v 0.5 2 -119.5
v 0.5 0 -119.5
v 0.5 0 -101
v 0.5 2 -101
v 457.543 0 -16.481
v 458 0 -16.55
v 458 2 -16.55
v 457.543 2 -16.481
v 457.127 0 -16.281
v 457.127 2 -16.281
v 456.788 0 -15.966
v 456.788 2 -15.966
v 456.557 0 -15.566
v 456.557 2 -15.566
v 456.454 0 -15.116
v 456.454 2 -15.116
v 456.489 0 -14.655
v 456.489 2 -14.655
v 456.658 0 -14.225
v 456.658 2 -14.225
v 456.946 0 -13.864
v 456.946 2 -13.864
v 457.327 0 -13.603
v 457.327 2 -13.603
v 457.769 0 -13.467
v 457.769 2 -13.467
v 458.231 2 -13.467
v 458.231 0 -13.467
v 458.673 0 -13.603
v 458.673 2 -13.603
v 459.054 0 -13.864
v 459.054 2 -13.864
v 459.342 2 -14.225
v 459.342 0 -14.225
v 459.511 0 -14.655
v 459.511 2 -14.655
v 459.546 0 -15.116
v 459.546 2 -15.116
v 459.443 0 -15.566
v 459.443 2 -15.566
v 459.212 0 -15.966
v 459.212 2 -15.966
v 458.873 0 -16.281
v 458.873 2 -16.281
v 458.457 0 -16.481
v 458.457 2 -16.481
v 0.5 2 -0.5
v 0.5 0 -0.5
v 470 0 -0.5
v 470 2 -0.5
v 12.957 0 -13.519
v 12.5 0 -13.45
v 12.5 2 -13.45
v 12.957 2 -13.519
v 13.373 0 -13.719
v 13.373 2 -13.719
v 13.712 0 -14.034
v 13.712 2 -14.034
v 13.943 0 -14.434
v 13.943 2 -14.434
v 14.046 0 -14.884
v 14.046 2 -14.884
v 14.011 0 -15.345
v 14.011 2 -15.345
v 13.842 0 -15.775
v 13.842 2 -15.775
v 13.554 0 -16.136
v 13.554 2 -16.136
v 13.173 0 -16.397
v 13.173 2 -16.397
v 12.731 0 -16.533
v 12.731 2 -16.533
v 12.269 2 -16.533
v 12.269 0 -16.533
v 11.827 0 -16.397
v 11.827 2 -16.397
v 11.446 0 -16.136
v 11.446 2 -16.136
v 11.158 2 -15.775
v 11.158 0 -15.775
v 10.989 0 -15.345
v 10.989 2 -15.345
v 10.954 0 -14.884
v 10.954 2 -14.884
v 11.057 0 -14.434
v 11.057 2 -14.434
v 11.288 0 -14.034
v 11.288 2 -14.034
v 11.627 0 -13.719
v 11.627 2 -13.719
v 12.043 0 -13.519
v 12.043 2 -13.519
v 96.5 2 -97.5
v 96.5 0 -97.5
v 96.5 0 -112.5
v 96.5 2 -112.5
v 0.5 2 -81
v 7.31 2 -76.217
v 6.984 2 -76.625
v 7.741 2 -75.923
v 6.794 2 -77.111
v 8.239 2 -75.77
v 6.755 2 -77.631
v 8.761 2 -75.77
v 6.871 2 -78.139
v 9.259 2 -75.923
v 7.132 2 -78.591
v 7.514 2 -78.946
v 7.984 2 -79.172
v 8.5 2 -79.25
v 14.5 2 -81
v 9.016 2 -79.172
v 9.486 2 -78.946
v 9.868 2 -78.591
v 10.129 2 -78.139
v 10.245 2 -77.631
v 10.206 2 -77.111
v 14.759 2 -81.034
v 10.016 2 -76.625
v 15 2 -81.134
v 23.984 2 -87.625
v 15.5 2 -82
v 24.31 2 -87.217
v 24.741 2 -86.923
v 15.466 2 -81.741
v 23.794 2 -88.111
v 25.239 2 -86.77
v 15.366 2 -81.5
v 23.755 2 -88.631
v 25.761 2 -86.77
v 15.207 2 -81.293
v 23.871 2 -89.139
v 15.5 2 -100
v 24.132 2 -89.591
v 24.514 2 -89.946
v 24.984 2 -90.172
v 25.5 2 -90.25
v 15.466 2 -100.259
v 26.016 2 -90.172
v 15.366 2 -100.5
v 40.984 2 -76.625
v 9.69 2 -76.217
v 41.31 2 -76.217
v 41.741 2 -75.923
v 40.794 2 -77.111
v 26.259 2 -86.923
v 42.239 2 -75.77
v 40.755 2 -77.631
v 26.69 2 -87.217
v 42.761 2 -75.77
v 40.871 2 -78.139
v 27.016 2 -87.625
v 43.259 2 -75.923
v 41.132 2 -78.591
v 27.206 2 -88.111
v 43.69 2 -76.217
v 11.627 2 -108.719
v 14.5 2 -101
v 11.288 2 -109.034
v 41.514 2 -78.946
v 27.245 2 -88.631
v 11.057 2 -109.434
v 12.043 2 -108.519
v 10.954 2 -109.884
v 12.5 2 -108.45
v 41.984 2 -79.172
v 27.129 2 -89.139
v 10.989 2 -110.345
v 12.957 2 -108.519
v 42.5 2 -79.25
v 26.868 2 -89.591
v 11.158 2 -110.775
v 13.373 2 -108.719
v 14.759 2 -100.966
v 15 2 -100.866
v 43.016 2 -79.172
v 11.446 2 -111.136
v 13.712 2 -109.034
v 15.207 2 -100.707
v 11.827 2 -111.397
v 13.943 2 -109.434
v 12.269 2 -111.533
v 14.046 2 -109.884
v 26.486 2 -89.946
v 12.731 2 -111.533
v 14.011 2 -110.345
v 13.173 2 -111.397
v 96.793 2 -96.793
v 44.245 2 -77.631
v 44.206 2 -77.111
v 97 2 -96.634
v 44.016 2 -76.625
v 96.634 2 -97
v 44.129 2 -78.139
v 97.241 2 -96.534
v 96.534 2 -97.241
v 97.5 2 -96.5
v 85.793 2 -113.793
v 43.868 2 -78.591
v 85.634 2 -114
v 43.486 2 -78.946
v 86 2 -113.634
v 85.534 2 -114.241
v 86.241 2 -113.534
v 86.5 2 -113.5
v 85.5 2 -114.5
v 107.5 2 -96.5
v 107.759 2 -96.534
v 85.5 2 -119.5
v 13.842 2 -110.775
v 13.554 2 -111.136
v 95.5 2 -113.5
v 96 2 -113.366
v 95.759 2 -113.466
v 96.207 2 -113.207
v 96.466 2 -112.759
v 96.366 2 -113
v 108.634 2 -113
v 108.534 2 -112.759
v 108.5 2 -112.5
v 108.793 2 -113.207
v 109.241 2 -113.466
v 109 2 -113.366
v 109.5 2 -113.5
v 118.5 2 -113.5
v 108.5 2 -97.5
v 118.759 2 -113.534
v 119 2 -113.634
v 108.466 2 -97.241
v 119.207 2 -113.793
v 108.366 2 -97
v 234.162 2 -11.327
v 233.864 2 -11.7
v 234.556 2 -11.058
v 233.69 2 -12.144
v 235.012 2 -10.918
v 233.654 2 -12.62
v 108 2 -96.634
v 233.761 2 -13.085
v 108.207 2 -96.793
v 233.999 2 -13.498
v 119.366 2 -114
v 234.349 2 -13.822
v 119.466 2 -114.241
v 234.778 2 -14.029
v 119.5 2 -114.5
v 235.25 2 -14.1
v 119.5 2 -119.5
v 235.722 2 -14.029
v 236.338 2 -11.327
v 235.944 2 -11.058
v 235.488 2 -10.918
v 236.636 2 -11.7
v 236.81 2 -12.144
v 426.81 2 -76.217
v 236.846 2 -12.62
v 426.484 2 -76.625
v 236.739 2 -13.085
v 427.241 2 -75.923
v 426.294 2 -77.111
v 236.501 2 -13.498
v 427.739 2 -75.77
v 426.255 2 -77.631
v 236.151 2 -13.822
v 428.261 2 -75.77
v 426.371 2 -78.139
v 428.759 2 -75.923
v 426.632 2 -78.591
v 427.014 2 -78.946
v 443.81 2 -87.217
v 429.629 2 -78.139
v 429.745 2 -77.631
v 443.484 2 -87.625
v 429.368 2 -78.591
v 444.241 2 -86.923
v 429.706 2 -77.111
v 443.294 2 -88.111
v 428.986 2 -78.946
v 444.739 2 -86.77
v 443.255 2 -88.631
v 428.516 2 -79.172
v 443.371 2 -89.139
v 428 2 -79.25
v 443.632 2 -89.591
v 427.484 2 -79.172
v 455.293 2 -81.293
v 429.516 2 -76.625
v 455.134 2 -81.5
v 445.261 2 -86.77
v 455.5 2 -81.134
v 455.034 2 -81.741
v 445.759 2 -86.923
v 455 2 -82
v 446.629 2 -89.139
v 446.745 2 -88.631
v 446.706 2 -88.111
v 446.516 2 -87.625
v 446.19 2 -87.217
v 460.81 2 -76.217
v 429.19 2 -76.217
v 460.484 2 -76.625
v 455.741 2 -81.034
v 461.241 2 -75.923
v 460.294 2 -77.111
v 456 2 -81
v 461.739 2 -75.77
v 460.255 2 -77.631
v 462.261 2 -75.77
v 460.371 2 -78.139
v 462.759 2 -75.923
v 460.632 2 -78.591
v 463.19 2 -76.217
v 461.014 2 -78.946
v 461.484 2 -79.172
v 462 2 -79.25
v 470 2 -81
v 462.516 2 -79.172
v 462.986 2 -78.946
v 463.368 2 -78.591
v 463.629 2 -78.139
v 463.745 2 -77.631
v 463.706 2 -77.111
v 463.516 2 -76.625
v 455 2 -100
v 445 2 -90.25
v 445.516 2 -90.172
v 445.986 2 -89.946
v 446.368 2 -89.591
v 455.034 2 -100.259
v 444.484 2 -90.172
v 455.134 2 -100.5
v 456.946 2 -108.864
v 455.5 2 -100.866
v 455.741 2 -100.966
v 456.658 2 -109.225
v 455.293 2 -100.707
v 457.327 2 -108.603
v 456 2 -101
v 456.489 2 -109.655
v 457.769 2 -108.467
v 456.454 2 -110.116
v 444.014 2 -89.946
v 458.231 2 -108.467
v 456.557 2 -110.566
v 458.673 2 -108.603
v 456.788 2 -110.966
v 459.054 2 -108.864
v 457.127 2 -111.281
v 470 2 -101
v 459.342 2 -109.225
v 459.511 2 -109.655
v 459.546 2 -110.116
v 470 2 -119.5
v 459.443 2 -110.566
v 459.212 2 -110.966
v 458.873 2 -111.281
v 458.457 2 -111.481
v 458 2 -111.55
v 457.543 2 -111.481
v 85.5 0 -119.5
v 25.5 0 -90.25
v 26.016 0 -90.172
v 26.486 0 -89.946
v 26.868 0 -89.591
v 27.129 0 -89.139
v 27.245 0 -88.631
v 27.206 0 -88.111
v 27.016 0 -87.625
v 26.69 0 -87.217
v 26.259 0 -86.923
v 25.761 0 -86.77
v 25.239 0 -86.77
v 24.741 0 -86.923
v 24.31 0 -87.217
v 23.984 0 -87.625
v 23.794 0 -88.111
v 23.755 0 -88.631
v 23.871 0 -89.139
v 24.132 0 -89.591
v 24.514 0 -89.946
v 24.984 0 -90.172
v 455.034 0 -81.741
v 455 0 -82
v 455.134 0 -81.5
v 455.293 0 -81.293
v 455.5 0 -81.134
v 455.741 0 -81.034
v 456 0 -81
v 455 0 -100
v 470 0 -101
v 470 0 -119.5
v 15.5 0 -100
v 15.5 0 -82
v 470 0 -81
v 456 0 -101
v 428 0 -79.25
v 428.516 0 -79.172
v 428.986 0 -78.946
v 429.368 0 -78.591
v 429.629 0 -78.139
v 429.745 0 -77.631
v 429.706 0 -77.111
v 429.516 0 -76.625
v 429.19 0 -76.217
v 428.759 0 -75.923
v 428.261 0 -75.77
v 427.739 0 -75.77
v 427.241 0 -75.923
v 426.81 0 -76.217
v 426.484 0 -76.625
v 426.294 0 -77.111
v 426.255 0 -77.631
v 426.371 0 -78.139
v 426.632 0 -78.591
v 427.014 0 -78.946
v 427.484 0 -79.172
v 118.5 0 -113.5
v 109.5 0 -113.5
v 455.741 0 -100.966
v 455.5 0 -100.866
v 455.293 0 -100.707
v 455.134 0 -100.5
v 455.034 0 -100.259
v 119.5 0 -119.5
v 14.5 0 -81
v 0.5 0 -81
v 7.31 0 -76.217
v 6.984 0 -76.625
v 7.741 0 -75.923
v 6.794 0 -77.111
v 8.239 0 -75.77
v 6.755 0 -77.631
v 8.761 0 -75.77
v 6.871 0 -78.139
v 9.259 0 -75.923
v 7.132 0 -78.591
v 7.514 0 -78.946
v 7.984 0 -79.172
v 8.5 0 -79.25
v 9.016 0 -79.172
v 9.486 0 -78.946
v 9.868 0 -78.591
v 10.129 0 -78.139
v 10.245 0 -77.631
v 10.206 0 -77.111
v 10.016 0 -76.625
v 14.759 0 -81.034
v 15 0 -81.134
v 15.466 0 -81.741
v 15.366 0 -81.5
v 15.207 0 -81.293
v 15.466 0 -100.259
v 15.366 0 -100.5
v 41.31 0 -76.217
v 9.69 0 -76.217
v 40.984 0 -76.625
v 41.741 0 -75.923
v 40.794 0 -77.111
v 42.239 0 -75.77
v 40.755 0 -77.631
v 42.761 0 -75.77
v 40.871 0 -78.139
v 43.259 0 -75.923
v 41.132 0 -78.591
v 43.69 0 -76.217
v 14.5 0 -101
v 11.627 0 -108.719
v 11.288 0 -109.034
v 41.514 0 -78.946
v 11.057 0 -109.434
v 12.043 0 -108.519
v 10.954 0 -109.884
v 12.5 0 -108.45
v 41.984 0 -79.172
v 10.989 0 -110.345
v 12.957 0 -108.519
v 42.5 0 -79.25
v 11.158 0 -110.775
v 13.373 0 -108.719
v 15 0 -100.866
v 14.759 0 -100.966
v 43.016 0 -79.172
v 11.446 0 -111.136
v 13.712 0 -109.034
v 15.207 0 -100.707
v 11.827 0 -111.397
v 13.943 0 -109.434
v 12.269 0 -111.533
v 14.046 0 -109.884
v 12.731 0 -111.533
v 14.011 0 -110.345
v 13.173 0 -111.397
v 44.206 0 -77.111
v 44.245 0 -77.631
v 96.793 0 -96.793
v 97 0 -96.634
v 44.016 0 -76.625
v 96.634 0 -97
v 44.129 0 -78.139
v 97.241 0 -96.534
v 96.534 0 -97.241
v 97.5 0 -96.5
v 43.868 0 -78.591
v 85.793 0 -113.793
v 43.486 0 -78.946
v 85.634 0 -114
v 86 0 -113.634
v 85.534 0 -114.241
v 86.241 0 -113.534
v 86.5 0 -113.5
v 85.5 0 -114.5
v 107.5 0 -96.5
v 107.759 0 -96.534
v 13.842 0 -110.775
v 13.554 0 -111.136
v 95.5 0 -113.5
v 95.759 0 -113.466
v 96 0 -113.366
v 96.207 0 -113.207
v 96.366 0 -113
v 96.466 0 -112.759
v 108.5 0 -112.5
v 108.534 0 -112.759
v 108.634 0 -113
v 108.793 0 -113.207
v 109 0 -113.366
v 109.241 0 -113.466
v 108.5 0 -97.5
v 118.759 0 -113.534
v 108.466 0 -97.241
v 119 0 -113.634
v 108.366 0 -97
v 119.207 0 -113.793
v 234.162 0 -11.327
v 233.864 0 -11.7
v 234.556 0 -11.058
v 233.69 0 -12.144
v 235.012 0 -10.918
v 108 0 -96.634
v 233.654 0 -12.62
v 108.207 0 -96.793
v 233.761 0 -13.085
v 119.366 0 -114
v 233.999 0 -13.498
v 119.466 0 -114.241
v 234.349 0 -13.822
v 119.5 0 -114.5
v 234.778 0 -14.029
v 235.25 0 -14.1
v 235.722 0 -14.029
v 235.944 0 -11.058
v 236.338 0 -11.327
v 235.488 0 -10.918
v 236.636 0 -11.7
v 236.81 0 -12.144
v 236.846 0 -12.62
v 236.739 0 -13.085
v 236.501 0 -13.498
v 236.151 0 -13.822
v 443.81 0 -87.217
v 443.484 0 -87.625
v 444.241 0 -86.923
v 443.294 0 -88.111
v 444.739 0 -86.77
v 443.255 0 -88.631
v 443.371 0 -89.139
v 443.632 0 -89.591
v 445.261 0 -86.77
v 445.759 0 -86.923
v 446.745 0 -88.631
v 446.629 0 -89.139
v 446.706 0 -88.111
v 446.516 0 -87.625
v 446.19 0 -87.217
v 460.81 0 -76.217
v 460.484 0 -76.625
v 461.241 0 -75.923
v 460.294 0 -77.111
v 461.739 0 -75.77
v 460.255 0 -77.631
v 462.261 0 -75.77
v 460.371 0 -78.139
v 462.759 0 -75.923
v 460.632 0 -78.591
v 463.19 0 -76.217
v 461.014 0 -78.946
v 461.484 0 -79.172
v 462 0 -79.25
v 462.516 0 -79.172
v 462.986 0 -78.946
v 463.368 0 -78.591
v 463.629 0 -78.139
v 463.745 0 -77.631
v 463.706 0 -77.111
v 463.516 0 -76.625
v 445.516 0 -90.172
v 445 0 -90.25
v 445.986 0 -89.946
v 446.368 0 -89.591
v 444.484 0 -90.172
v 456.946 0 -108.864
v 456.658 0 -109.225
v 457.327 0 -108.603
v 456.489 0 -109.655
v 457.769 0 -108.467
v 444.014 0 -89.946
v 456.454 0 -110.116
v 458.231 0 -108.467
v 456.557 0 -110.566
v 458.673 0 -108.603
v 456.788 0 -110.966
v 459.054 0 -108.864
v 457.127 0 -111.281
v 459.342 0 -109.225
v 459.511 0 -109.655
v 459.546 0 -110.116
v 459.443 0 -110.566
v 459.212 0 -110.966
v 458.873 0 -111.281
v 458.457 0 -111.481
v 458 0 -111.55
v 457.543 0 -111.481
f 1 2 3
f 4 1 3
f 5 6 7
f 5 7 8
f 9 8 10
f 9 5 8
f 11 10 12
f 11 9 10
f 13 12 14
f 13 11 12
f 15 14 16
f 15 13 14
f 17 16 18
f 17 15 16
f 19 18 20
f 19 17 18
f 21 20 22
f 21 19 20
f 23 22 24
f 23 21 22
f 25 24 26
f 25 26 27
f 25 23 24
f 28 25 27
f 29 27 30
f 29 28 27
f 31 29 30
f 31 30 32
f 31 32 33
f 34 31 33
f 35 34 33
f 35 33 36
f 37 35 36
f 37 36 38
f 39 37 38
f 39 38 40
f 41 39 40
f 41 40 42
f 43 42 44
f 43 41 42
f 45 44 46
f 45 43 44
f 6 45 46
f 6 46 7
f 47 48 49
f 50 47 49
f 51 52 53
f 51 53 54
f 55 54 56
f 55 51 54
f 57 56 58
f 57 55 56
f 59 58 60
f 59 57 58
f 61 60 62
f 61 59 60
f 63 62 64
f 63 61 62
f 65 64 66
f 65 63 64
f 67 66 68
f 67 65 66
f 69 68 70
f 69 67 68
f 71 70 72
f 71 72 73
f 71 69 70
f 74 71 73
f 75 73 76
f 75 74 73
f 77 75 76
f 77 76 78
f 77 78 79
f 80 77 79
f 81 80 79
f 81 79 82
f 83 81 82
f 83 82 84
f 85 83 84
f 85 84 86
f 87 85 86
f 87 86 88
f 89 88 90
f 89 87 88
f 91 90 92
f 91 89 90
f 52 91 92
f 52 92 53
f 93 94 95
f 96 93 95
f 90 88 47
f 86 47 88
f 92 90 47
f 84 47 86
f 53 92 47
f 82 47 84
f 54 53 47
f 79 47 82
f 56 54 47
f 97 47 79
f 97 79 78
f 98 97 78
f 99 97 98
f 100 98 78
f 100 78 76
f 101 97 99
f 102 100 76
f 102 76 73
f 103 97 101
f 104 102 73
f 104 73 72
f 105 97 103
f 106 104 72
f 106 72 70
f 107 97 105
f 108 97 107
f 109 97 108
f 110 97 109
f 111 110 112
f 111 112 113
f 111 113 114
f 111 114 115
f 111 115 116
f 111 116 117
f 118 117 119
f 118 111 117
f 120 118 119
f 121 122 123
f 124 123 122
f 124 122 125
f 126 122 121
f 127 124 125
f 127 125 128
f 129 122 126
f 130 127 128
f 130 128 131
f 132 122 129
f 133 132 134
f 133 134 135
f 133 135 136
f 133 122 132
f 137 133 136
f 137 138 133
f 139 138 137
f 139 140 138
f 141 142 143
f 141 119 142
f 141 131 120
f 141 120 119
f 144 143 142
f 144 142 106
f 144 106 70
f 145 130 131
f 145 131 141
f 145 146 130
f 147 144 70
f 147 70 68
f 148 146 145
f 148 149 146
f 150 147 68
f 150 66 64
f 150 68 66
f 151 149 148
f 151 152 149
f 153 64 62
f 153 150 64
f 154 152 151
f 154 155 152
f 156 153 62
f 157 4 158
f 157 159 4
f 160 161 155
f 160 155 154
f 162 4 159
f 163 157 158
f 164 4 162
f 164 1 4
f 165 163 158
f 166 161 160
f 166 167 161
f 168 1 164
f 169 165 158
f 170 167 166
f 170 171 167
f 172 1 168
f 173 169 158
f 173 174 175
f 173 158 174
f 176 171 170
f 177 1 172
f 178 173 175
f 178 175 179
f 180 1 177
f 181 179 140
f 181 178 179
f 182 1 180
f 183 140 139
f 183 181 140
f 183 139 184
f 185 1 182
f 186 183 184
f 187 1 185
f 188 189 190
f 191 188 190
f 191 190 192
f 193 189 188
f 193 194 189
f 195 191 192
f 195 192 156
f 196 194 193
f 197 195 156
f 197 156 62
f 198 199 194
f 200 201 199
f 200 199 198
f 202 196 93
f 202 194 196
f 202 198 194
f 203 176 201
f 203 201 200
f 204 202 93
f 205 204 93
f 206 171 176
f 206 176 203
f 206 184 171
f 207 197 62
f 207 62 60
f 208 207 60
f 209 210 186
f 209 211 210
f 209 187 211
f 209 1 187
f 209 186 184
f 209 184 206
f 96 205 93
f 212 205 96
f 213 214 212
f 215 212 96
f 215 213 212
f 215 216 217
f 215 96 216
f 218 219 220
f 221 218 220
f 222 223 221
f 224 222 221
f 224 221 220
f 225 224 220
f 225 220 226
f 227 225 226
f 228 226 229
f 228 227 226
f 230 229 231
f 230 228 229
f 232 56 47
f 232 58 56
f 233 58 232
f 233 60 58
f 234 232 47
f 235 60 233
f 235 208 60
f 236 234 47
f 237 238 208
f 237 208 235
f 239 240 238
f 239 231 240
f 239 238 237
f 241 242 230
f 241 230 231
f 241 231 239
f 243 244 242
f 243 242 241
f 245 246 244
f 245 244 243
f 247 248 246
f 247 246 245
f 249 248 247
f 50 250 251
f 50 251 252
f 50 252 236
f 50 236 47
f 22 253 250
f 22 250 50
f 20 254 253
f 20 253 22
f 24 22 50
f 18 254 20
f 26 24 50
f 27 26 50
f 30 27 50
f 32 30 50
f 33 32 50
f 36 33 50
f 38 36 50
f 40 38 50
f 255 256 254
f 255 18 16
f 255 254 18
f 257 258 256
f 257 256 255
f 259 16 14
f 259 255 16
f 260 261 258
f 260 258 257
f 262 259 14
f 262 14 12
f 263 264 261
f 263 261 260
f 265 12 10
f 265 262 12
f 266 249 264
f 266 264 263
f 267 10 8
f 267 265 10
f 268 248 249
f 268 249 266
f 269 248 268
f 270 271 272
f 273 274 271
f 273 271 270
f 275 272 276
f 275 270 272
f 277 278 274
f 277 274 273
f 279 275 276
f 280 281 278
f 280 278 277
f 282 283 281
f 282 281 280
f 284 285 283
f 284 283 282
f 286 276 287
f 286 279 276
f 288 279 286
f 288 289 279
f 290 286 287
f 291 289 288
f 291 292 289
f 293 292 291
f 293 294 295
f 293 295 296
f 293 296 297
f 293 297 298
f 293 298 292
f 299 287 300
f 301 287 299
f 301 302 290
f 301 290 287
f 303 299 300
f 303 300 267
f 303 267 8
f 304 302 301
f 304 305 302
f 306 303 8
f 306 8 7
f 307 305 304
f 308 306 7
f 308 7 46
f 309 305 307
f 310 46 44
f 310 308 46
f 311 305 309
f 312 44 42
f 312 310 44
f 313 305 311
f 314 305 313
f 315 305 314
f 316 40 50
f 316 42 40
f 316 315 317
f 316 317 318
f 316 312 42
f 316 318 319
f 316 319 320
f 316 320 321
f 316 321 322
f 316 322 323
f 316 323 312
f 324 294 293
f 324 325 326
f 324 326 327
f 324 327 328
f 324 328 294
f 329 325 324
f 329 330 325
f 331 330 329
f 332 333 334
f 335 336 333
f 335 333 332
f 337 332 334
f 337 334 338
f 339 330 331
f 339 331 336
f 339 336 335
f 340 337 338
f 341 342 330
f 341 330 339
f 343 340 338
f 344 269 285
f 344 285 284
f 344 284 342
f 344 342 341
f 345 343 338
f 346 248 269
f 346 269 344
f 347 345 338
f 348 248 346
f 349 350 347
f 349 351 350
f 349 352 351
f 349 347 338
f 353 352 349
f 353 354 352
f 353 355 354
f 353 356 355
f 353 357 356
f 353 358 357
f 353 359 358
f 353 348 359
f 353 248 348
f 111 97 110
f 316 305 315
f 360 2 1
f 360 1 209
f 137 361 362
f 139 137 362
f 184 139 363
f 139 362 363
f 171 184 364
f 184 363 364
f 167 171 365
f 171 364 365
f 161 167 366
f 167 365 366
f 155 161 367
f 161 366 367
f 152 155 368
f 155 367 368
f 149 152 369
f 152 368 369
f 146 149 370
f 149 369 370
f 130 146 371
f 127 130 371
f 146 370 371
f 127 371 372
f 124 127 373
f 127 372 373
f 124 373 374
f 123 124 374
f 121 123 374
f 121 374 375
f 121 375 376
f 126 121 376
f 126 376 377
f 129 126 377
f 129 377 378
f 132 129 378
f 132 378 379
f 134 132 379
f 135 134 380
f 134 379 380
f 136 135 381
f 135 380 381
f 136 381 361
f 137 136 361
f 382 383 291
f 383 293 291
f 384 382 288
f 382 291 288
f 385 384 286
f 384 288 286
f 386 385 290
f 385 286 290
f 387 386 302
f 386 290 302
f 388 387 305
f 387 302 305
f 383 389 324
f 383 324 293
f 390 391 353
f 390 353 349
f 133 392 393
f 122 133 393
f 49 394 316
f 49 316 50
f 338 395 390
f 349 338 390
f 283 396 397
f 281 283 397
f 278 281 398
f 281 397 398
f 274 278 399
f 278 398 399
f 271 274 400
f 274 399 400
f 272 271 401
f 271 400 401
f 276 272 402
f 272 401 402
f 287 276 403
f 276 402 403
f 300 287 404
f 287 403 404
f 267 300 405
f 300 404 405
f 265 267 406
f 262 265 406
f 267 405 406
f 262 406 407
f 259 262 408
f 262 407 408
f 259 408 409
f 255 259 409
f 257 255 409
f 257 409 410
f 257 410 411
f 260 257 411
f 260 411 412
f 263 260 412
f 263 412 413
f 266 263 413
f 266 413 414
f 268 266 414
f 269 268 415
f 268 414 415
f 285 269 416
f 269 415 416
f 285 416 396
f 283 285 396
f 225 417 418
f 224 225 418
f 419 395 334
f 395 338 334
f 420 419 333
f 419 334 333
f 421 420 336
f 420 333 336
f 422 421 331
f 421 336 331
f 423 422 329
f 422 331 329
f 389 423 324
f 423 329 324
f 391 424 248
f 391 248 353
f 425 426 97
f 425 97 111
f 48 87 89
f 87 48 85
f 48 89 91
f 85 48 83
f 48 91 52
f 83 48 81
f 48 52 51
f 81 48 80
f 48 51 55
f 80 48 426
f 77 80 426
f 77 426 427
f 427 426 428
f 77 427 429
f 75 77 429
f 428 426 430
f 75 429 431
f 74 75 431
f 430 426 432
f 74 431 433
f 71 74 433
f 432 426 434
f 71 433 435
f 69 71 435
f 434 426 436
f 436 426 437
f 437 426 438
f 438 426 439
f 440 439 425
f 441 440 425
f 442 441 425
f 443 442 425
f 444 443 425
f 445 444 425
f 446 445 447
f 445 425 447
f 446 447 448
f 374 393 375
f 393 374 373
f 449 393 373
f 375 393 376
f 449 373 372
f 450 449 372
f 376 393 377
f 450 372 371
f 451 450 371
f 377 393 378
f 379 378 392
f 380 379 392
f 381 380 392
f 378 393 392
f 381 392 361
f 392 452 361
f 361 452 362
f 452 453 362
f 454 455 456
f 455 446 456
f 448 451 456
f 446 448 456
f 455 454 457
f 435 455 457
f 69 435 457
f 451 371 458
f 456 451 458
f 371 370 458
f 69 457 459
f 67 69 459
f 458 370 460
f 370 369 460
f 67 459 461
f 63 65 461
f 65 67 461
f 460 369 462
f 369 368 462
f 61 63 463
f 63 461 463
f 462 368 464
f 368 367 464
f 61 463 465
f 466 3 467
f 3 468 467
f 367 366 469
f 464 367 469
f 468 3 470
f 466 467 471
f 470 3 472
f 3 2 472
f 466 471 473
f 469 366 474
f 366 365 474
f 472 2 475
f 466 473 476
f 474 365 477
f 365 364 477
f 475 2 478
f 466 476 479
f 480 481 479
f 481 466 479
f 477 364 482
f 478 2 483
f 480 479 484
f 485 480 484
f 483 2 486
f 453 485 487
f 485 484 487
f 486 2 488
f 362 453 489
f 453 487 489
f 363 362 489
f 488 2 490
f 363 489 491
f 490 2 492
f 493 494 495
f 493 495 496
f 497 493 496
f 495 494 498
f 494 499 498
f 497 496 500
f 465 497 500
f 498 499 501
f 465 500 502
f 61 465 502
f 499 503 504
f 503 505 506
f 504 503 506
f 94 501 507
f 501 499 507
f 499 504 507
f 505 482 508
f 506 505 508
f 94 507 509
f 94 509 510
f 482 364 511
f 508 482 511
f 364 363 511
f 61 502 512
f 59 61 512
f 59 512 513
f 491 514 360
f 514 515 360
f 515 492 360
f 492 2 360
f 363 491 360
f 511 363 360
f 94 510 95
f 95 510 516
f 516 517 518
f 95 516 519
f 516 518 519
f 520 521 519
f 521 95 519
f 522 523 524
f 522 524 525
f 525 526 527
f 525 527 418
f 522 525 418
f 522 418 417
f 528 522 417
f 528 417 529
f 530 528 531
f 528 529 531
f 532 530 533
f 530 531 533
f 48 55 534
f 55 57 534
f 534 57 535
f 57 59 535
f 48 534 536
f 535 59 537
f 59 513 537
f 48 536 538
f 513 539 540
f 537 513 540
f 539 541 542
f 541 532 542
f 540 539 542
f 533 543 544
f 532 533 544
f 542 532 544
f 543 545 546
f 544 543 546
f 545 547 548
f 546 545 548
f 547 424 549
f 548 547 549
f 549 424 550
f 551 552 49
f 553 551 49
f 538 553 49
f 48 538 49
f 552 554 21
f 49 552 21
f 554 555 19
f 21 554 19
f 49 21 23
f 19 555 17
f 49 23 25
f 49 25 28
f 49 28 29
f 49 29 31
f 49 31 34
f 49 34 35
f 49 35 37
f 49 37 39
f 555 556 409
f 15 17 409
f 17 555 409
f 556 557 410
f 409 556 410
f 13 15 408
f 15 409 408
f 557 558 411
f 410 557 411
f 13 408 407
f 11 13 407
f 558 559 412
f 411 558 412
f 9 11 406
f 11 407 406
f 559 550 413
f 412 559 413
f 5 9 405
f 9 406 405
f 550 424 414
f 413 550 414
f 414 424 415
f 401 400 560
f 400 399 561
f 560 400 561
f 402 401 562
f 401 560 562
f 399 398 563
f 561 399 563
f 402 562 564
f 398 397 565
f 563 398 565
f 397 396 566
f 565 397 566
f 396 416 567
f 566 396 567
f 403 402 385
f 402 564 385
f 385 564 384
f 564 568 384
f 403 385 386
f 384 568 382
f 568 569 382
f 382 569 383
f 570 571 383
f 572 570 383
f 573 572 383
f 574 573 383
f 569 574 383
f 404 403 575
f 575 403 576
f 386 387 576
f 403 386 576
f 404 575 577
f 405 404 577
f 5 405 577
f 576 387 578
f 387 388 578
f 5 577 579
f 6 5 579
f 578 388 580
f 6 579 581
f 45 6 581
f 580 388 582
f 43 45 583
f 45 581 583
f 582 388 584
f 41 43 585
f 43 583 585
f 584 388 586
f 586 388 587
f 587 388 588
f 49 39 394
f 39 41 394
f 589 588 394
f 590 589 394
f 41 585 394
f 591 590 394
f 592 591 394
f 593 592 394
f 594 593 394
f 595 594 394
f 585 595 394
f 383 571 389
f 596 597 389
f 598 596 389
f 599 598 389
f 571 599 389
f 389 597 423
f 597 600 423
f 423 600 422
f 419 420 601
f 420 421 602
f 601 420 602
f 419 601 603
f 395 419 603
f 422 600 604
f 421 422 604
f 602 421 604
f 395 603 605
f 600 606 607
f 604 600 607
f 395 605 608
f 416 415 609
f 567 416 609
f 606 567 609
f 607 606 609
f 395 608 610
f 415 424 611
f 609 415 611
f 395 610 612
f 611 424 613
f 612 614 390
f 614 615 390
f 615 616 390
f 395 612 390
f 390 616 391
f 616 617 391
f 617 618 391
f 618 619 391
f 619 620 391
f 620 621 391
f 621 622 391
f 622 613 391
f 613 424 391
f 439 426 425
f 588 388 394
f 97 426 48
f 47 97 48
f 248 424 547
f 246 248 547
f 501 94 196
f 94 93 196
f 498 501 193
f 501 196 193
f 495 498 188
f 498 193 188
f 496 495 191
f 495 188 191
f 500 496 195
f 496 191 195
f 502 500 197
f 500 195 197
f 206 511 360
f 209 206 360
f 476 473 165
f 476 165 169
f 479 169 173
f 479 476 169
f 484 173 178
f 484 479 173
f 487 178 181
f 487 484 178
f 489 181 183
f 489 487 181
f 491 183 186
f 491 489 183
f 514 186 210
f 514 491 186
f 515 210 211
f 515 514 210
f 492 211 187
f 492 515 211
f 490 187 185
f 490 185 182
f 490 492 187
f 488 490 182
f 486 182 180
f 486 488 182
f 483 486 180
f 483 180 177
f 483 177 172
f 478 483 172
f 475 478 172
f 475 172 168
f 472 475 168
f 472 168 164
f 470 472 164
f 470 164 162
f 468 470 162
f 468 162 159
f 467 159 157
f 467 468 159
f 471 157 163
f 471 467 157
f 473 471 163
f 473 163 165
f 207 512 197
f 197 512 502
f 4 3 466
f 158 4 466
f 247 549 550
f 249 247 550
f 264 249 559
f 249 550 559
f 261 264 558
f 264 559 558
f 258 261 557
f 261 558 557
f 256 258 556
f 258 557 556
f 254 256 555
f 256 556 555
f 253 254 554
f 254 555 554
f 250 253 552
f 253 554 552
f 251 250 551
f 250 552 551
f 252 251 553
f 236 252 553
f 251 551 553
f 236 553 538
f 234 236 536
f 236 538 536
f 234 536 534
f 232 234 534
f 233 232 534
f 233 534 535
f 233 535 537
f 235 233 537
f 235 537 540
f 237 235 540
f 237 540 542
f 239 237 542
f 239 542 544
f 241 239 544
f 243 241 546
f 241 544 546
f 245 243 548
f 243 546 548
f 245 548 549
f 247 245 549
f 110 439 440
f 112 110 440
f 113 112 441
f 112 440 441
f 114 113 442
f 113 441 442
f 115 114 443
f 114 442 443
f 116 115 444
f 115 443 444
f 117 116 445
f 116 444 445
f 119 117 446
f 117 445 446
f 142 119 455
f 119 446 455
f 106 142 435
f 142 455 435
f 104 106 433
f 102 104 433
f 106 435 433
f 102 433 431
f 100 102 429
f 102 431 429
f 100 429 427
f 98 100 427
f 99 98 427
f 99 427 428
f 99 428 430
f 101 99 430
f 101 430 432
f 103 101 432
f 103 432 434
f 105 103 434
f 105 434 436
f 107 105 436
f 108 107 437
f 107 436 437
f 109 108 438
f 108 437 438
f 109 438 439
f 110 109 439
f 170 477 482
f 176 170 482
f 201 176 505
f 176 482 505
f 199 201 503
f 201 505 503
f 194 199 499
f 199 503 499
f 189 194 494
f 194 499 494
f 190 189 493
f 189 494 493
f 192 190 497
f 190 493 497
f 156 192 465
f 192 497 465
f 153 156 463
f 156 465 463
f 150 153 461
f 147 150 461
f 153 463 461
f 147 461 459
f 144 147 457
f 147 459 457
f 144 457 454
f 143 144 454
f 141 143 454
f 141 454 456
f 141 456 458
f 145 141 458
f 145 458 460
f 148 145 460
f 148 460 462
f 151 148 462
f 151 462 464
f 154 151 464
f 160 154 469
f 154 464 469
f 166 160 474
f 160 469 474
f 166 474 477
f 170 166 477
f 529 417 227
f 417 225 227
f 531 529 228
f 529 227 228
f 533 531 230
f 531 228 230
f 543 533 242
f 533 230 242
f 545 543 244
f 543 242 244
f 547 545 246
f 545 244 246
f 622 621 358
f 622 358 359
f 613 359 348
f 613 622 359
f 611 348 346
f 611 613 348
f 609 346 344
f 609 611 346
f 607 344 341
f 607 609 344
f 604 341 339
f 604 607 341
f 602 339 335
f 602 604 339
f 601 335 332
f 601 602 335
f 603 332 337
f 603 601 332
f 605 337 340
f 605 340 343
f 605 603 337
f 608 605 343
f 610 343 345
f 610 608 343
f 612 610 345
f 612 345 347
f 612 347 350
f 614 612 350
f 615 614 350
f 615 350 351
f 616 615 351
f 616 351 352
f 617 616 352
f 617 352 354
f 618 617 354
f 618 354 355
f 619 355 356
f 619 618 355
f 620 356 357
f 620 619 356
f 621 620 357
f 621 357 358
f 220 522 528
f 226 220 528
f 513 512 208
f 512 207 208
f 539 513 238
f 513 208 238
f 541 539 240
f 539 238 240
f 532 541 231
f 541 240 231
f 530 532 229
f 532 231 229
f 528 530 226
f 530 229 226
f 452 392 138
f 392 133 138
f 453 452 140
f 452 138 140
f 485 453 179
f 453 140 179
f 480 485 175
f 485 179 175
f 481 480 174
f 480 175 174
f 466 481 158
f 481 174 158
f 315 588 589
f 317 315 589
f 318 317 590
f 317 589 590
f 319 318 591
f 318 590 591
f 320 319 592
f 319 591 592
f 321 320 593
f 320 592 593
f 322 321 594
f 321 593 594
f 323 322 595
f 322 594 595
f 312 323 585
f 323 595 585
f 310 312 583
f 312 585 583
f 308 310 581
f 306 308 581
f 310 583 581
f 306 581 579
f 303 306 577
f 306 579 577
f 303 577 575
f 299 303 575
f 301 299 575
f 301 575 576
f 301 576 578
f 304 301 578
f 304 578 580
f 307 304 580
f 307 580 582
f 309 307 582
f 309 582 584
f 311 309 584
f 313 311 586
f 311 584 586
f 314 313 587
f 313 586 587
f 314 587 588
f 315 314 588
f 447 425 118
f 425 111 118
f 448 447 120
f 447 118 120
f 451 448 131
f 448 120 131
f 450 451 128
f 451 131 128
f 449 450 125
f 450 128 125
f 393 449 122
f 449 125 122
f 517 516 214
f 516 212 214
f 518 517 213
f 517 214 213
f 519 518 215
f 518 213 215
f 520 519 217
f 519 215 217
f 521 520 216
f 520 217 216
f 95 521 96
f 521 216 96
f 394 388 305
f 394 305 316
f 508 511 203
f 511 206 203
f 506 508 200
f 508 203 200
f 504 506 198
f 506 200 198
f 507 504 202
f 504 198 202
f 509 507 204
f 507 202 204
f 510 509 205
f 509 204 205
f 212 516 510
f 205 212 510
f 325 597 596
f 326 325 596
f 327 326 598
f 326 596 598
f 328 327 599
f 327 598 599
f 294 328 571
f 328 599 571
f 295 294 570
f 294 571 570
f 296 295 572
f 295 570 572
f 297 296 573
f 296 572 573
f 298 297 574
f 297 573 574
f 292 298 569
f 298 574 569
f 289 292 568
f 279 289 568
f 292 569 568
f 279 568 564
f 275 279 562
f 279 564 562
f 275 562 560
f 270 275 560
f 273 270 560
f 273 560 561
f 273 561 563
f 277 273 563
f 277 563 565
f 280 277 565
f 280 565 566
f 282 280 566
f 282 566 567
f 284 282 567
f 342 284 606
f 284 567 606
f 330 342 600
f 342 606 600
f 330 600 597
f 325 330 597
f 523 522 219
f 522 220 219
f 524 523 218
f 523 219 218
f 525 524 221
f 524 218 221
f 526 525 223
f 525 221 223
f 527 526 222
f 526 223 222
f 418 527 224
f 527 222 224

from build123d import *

# Parameters (mm, degrees)
CROQUIS1_W              = 470.5
CROQUIS1_H              = 120
CROQUIS1_R              = 1.55
SALIENTE_EXTRUIR1_DEPTH = 2
CROQUIS2_W              = 470.5
CROQUIS2_H              = 120
CROQUIS2_W_2            = 469.5
CROQUIS2_H_2            = 119
CORTAR_EXTRUIR1_DEPTH   = 2
CORTAR_EXTRUIR2_DEPTH   = 2
REDONDEO1_R             = 1
CROQUIS4_R              = 1.6
CORTAR_EXTRUIR3_DEPTH   = 2
CROQUIS5_R              = 1.75
CORTAR_EXTRUIR4_DEPTH   = 2
CROQUIS6_W              = 15
CROQUIS6_H              = 20
CORTAR_EXTRUIR5_DEPTH   = 2
REDONDEO2_R             = 1


with BuildPart() as part:
    # Croquis1 → Saliente-Extruir1 (new body)
    with BuildSketch(Plane(origin=(0, 0, 0), x_dir=(1, 0, 0), z_dir=(0, 1, 0))):
        with Locations((235.25, 60)):
            Rectangle(CROQUIS1_W, CROQUIS1_H)
        with Locations(Location((12.5, 15, 0), (0, 0, 270))):
            Circle(CROQUIS1_R, mode=Mode.SUBTRACT)
        with Locations(Location((12.5, 110, 0), (0, 0, 270))):
            Circle(CROQUIS1_R, mode=Mode.SUBTRACT)
        with Locations(Location((458, 15, 0), (0, 0, 90))):
            Circle(CROQUIS1_R, mode=Mode.SUBTRACT)
        with Locations(Location((458, 110, 0), (0, 0, 90))):
            Circle(CROQUIS1_R, mode=Mode.SUBTRACT)
    extrude(amount=SALIENTE_EXTRUIR1_DEPTH)

    # Croquis2 → Cortar-Extruir1 (cut)
    with BuildSketch(Plane.XZ):
        with Locations((235.25, -60)):
            Rectangle(CROQUIS2_W, CROQUIS2_H)
        with Locations((235.25, -60)):
            Rectangle(CROQUIS2_W_2, CROQUIS2_H_2, mode=Mode.SUBTRACT)
    extrude(amount=-CORTAR_EXTRUIR1_DEPTH, mode=Mode.SUBTRACT)

    # Croquis3 → Cortar-Extruir2 (cut)
    with BuildSketch(Plane.XZ):
        Polygon((85.5, -119.5), (119.5, -119.5), (119.5, -113.5), (108.5, -113.5), (108.5, -96.5), (96.5, -96.5), (96.5, -113.5), (85.5, -113.5), align=None)
    extrude(amount=-CORTAR_EXTRUIR2_DEPTH, mode=Mode.SUBTRACT)

    # Redondeo1
    redondeo1_edges = [part.edges().sort_by_distance(p)[0] for p in [
        (85.5, 1, -113.5),
        (96.5, 1, -113.5),
        (96.5, 1, -96.5),
        (108.5, 1, -96.5),
        (108.5, 1, -113.5),
        (119.5, 1, -113.5),
    ]]
    fillet(redondeo1_edges, radius=REDONDEO1_R)

    # Croquis4 → Cortar-Extruir3 (cut)
    with BuildSketch(Plane.XZ):
        with Locations(Location((235.25, -12.5, 0), (0, 0, 270))):
            Circle(CROQUIS4_R)
    extrude(amount=-CORTAR_EXTRUIR3_DEPTH, mode=Mode.SUBTRACT)

    # Croquis5 → Cortar-Extruir4 (cut)
    with BuildSketch(Plane.XZ):
        with Locations(Location((8.5, -77.5, 0), (0, 0, 270))):
            Circle(CROQUIS5_R)
        with Locations(Location((42.5, -77.5, 0), (0, 0, 270))):
            Circle(CROQUIS5_R)
        with Locations(Location((25.5, -88.5, 0), (0, 0, 270))):
            Circle(CROQUIS5_R)
        with Locations(Location((462, -77.5, 0), (0, 0, 270))):
            Circle(CROQUIS5_R)
        with Locations(Location((428, -77.5, 0), (0, 0, 270))):
            Circle(CROQUIS5_R)
        with Locations(Location((445, -88.5, 0), (0, 0, 270))):
            Circle(CROQUIS5_R)
    extrude(amount=-CORTAR_EXTRUIR4_DEPTH, mode=Mode.SUBTRACT)

    # Croquis6 → Cortar-Extruir5 (cut)
    with BuildSketch(Plane.XZ):
        with Locations((8, -91)):
            Rectangle(CROQUIS6_W, CROQUIS6_H)
        with Locations((462.5, -91)):
            Rectangle(CROQUIS6_W, CROQUIS6_H)
    extrude(amount=-CORTAR_EXTRUIR5_DEPTH, mode=Mode.SUBTRACT)

    # Redondeo2
    redondeo2_edges = [part.edges().sort_by_distance(p)[0] for p in [
        (15.5, 1, -81),
        (15.5, 1, -101),
        (455, 1, -81),
        (455, 1, -101),
    ]]
    fillet(redondeo2_edges, radius=REDONDEO2_R)


solid = part.part
